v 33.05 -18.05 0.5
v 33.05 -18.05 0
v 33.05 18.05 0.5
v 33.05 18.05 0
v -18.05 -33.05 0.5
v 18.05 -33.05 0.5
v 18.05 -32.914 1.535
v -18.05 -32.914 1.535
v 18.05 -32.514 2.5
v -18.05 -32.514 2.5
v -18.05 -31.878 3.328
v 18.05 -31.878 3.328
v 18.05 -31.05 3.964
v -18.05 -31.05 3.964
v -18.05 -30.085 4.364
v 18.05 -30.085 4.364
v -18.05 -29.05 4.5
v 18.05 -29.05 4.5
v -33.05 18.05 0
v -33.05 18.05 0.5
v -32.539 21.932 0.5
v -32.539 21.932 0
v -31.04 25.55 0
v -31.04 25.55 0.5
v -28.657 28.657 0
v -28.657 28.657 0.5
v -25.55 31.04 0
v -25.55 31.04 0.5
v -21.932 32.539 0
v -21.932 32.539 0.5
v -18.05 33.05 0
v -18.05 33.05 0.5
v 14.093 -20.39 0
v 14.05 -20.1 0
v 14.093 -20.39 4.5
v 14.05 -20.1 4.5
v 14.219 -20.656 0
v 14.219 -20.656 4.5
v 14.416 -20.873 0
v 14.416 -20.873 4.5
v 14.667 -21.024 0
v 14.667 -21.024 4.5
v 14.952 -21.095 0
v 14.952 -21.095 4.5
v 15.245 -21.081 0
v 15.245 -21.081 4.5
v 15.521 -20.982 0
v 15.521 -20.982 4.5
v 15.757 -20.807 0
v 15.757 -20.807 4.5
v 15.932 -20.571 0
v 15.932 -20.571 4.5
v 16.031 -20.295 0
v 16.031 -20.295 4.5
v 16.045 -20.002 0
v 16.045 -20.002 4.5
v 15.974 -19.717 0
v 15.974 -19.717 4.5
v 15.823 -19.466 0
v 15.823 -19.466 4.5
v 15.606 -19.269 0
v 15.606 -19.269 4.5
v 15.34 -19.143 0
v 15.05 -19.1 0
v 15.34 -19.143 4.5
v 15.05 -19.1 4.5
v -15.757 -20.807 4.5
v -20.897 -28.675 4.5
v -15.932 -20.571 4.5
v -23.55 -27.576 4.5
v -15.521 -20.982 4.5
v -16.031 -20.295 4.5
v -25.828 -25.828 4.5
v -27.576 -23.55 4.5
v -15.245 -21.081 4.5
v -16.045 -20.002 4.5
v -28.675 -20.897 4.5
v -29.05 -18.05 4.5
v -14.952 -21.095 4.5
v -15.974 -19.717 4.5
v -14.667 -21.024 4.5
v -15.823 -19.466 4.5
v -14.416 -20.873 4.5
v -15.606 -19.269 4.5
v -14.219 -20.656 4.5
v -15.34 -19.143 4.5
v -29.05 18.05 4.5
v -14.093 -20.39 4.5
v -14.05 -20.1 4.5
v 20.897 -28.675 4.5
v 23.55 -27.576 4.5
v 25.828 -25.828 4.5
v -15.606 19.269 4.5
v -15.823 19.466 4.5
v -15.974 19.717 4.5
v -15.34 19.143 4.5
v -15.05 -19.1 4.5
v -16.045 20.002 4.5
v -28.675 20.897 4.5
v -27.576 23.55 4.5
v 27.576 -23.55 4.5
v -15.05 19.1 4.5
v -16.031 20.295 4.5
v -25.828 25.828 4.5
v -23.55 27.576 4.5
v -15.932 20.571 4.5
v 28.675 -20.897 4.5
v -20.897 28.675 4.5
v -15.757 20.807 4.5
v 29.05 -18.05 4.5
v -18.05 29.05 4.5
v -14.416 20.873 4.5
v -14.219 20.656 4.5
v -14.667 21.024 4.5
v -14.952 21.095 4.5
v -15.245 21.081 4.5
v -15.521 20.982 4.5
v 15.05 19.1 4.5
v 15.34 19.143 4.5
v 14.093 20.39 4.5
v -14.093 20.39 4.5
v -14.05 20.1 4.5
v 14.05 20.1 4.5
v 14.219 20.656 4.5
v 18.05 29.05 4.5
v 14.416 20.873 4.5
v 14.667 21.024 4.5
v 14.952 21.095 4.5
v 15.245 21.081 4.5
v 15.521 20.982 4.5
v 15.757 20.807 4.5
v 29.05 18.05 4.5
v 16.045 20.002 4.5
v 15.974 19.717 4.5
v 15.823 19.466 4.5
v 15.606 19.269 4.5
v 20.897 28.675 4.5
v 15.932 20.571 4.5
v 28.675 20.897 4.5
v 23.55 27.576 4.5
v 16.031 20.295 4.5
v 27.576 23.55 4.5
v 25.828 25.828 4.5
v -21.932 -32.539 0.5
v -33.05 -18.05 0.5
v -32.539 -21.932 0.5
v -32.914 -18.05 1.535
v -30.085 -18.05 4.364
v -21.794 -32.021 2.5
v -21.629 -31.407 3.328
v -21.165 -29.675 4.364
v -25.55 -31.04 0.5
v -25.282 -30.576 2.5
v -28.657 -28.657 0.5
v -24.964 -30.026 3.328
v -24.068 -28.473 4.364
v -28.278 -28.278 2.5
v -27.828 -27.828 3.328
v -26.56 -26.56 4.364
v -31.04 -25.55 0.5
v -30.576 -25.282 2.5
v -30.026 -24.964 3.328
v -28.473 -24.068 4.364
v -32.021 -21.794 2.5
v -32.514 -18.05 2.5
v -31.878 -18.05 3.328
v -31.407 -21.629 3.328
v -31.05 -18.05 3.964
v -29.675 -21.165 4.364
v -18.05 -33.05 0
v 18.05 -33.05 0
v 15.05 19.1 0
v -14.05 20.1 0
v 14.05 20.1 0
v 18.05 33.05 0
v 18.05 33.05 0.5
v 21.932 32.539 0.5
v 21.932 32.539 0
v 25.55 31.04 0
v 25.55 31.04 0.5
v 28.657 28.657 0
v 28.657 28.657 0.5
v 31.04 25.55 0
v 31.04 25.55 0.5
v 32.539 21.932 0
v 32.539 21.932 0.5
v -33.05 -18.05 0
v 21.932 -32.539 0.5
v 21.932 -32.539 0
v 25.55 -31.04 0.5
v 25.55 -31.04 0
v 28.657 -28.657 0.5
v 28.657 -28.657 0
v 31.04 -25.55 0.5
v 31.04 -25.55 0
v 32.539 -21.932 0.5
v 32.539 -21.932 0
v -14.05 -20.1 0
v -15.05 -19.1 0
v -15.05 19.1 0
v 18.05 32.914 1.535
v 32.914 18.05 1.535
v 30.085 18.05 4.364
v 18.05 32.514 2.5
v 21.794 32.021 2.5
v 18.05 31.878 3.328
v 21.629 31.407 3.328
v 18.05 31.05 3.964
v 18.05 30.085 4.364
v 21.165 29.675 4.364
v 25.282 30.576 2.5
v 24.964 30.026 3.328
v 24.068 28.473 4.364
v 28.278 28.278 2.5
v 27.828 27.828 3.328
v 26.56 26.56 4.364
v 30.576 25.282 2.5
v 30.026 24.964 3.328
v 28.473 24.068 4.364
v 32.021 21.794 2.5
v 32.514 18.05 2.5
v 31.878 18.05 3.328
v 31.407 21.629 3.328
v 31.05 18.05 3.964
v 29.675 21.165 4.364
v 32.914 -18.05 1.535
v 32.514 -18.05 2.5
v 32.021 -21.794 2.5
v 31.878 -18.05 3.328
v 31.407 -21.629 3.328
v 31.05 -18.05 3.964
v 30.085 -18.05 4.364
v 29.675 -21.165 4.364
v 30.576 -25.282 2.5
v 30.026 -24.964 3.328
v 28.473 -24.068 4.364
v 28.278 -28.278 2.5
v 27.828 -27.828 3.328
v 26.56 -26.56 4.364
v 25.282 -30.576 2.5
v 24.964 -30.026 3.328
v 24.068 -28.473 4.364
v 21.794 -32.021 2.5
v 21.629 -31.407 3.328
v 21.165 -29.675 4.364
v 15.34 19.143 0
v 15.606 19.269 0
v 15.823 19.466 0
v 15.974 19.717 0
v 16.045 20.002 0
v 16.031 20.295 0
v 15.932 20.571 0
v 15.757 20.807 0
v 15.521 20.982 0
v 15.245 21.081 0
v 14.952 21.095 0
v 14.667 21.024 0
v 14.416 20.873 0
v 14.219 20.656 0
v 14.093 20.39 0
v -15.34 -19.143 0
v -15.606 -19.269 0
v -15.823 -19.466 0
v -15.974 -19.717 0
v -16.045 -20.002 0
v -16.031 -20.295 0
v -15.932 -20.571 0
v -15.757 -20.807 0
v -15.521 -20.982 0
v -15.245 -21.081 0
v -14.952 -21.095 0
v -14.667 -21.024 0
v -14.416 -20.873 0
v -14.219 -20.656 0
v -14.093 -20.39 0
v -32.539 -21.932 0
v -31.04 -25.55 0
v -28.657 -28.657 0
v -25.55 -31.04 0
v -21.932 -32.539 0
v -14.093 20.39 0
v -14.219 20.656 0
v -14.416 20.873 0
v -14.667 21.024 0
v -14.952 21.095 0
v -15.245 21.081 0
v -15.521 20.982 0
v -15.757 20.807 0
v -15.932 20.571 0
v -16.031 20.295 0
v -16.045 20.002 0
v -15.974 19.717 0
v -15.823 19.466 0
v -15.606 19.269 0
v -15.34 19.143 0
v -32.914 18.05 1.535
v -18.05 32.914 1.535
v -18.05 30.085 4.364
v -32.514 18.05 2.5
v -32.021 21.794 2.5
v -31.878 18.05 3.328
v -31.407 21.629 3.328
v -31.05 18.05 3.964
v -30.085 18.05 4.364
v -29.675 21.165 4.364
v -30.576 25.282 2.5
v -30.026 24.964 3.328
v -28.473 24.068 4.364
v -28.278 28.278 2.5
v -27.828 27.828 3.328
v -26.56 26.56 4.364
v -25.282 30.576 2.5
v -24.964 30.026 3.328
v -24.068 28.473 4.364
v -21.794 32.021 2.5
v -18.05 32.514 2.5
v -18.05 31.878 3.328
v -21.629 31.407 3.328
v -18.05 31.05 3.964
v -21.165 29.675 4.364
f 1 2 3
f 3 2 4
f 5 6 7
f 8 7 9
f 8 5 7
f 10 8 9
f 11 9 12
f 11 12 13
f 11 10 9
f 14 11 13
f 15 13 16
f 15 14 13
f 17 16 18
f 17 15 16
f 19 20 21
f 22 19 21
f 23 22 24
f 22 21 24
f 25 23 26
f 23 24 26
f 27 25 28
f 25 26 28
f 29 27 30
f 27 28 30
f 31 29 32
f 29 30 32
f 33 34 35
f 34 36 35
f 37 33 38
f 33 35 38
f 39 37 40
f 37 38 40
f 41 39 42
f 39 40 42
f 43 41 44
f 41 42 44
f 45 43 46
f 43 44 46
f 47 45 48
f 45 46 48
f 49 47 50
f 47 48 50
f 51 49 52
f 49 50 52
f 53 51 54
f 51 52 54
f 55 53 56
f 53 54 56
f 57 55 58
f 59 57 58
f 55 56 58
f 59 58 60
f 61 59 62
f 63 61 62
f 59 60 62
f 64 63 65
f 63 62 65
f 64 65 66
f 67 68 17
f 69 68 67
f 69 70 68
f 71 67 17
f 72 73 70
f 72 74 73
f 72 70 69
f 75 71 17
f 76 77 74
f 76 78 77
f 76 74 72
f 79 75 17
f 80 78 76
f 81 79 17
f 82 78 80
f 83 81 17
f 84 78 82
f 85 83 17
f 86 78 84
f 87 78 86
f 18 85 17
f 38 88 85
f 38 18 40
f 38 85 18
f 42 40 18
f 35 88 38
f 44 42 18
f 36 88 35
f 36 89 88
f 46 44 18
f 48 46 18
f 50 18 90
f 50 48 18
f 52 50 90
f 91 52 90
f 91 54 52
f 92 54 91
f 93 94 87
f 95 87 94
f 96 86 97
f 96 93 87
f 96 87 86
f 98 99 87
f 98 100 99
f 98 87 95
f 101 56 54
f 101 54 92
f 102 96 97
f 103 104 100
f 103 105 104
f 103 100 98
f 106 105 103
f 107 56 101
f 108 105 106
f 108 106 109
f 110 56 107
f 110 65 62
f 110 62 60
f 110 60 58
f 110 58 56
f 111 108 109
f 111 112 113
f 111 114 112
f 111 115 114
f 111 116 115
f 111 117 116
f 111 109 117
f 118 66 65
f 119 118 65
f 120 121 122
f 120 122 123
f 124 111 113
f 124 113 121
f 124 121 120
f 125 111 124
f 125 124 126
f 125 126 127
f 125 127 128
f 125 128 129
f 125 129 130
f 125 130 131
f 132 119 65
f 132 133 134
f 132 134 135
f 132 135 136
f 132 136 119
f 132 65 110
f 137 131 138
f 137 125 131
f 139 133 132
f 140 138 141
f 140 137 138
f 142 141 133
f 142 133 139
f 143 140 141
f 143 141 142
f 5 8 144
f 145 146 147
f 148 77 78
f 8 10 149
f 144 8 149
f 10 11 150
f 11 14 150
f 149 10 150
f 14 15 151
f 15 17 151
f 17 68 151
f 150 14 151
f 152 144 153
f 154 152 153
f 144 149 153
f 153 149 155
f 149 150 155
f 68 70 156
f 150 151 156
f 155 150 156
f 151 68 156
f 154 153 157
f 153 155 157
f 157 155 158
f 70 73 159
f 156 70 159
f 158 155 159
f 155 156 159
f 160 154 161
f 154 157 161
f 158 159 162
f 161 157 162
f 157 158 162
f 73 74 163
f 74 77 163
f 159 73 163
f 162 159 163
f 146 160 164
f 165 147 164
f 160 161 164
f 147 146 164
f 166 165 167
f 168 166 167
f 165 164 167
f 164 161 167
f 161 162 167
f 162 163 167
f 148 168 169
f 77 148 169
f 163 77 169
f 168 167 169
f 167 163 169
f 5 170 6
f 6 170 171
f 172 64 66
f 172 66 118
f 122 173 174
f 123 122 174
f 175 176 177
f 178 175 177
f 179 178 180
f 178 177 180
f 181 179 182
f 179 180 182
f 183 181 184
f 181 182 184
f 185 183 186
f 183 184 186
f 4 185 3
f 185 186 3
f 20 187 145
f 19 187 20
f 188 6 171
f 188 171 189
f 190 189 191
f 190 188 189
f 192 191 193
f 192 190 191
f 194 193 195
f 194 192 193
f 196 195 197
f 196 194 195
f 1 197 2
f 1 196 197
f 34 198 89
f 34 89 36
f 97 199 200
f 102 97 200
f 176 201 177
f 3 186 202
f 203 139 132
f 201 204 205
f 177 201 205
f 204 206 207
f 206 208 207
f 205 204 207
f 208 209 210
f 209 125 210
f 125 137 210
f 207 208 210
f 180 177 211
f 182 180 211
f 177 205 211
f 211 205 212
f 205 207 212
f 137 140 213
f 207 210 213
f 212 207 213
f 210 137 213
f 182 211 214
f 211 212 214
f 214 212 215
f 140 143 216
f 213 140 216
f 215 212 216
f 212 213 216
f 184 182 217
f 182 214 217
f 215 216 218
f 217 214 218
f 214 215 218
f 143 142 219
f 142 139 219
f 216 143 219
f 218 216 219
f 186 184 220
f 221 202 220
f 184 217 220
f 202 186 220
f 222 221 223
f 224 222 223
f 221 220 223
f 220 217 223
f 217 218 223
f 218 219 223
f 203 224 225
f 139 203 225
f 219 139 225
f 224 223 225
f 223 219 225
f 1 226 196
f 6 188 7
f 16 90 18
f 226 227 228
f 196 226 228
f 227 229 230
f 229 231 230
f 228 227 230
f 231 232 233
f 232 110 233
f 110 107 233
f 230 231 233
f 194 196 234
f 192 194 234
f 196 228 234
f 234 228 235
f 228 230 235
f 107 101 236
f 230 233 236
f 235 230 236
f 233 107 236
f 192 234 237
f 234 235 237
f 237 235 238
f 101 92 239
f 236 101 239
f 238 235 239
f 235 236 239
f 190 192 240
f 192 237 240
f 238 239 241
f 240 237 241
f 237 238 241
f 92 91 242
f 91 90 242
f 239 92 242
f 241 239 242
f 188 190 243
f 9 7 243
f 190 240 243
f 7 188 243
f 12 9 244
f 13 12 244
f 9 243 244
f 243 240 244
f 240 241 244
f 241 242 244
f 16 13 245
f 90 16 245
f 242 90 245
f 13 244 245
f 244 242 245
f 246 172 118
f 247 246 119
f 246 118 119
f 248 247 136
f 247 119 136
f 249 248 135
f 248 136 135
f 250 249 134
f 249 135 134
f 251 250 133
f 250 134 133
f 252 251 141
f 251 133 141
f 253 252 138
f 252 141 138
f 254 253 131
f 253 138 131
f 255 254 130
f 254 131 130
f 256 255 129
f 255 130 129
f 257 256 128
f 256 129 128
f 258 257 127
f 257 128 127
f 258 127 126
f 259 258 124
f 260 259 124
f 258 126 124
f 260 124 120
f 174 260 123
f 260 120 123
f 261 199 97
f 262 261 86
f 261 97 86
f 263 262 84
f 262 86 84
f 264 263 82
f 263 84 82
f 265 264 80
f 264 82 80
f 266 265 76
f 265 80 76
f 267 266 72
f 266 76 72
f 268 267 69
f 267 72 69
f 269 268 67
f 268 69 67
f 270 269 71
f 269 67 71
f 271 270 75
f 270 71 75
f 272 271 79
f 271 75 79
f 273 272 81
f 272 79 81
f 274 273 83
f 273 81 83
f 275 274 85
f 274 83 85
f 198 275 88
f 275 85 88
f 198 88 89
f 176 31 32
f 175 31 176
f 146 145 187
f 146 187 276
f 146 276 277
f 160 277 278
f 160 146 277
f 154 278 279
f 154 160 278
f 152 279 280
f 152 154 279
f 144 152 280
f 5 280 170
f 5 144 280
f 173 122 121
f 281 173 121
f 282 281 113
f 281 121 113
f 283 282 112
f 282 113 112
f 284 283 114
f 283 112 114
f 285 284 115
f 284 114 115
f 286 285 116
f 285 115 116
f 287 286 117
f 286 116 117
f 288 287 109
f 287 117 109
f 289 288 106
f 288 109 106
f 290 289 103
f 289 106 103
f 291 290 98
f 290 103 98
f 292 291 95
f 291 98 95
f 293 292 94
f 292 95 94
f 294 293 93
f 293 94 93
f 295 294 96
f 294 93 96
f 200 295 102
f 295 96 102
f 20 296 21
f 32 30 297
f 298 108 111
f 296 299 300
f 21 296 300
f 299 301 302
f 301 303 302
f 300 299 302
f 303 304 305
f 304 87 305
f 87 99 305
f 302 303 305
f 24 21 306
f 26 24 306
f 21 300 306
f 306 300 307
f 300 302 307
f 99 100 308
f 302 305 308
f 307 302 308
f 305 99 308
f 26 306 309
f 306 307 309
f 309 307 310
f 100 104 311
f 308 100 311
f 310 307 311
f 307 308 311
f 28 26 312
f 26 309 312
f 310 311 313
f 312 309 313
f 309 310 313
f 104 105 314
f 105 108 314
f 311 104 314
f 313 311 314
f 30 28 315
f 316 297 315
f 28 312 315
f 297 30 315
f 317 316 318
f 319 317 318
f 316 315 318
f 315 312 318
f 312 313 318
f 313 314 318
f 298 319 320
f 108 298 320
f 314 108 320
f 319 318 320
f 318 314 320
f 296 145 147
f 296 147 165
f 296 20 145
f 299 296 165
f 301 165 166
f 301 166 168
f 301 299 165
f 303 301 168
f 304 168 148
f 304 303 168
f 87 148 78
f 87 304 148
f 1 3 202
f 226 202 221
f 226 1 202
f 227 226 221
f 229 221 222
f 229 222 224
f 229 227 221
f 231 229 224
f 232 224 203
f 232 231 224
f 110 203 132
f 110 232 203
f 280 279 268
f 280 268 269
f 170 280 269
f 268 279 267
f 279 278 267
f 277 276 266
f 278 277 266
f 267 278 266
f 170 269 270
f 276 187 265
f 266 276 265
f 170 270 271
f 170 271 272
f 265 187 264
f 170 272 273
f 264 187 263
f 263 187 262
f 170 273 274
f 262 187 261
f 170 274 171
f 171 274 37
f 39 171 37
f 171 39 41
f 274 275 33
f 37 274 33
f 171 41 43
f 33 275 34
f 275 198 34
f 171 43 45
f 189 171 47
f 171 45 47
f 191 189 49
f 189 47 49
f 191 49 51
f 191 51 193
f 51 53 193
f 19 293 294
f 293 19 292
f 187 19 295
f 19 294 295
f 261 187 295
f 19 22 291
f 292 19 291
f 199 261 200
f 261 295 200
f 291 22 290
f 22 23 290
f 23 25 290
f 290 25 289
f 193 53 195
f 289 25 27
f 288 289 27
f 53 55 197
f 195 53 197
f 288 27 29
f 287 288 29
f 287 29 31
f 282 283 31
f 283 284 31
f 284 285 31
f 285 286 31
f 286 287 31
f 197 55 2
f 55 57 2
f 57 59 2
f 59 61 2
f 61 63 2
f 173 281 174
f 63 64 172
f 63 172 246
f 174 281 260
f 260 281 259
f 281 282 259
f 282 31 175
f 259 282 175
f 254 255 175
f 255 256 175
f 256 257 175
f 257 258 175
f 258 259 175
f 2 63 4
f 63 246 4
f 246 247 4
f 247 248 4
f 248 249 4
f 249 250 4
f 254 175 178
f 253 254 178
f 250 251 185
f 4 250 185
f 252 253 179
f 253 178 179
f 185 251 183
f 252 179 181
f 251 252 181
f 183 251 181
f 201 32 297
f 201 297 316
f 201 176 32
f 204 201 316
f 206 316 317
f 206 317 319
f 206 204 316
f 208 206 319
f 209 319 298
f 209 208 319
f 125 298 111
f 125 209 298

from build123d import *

# Parameters (mm, degrees)
F0_W     = 66.1
F0_H     = 66.1
F0_W_2   = 30.1
F0_H_2   = 40.2
F1_DEPTH = 4.5
F2_R     = 15
F3_R     = 4
F4_R     = 1
F5_DEPTH = 25


with BuildPart() as f1:
    # F0 (on Top) → F1 (new body)
    with BuildSketch(Plane.XY):
        Rectangle(F0_W, F0_H)
        Rectangle(F0_W_2, F0_H_2, mode=Mode.SUBTRACT)
    extrude(amount=F1_DEPTH)

    # F2
    f2_edges = [f1.edges().sort_by_distance(p)[0] for p in [
        (-33.05, -33.05, 2.25),
        (33.05, -33.05, 2.25),
        (-33.05, 33.05, 2.25),
        (33.05, 33.05, 2.25),
    ]]
    fillet(f2_edges, radius=F2_R)

    # F3
    f3_edges = [f1.edges().sort_by_distance(p)[0] for p in [
        (-28.656602, 28.656602, 4.5),
    ]]
    fillet(f3_edges, radius=F3_R)

    # F4 (on face) → F5 (cut)
    with BuildSketch(Plane.XY.offset(4.5)):
        with Locations((15.05, 20.1)):
            Circle(F4_R)
        with Locations((15.05, -20.1)):
            Circle(F4_R)
        with Locations((-15.05, -20.1)):
            Circle(F4_R)
        with Locations((-15.05, 20.1)):
            Circle(F4_R)
    extrude(amount=-F5_DEPTH, mode=Mode.SUBTRACT)


solid = f1.part
